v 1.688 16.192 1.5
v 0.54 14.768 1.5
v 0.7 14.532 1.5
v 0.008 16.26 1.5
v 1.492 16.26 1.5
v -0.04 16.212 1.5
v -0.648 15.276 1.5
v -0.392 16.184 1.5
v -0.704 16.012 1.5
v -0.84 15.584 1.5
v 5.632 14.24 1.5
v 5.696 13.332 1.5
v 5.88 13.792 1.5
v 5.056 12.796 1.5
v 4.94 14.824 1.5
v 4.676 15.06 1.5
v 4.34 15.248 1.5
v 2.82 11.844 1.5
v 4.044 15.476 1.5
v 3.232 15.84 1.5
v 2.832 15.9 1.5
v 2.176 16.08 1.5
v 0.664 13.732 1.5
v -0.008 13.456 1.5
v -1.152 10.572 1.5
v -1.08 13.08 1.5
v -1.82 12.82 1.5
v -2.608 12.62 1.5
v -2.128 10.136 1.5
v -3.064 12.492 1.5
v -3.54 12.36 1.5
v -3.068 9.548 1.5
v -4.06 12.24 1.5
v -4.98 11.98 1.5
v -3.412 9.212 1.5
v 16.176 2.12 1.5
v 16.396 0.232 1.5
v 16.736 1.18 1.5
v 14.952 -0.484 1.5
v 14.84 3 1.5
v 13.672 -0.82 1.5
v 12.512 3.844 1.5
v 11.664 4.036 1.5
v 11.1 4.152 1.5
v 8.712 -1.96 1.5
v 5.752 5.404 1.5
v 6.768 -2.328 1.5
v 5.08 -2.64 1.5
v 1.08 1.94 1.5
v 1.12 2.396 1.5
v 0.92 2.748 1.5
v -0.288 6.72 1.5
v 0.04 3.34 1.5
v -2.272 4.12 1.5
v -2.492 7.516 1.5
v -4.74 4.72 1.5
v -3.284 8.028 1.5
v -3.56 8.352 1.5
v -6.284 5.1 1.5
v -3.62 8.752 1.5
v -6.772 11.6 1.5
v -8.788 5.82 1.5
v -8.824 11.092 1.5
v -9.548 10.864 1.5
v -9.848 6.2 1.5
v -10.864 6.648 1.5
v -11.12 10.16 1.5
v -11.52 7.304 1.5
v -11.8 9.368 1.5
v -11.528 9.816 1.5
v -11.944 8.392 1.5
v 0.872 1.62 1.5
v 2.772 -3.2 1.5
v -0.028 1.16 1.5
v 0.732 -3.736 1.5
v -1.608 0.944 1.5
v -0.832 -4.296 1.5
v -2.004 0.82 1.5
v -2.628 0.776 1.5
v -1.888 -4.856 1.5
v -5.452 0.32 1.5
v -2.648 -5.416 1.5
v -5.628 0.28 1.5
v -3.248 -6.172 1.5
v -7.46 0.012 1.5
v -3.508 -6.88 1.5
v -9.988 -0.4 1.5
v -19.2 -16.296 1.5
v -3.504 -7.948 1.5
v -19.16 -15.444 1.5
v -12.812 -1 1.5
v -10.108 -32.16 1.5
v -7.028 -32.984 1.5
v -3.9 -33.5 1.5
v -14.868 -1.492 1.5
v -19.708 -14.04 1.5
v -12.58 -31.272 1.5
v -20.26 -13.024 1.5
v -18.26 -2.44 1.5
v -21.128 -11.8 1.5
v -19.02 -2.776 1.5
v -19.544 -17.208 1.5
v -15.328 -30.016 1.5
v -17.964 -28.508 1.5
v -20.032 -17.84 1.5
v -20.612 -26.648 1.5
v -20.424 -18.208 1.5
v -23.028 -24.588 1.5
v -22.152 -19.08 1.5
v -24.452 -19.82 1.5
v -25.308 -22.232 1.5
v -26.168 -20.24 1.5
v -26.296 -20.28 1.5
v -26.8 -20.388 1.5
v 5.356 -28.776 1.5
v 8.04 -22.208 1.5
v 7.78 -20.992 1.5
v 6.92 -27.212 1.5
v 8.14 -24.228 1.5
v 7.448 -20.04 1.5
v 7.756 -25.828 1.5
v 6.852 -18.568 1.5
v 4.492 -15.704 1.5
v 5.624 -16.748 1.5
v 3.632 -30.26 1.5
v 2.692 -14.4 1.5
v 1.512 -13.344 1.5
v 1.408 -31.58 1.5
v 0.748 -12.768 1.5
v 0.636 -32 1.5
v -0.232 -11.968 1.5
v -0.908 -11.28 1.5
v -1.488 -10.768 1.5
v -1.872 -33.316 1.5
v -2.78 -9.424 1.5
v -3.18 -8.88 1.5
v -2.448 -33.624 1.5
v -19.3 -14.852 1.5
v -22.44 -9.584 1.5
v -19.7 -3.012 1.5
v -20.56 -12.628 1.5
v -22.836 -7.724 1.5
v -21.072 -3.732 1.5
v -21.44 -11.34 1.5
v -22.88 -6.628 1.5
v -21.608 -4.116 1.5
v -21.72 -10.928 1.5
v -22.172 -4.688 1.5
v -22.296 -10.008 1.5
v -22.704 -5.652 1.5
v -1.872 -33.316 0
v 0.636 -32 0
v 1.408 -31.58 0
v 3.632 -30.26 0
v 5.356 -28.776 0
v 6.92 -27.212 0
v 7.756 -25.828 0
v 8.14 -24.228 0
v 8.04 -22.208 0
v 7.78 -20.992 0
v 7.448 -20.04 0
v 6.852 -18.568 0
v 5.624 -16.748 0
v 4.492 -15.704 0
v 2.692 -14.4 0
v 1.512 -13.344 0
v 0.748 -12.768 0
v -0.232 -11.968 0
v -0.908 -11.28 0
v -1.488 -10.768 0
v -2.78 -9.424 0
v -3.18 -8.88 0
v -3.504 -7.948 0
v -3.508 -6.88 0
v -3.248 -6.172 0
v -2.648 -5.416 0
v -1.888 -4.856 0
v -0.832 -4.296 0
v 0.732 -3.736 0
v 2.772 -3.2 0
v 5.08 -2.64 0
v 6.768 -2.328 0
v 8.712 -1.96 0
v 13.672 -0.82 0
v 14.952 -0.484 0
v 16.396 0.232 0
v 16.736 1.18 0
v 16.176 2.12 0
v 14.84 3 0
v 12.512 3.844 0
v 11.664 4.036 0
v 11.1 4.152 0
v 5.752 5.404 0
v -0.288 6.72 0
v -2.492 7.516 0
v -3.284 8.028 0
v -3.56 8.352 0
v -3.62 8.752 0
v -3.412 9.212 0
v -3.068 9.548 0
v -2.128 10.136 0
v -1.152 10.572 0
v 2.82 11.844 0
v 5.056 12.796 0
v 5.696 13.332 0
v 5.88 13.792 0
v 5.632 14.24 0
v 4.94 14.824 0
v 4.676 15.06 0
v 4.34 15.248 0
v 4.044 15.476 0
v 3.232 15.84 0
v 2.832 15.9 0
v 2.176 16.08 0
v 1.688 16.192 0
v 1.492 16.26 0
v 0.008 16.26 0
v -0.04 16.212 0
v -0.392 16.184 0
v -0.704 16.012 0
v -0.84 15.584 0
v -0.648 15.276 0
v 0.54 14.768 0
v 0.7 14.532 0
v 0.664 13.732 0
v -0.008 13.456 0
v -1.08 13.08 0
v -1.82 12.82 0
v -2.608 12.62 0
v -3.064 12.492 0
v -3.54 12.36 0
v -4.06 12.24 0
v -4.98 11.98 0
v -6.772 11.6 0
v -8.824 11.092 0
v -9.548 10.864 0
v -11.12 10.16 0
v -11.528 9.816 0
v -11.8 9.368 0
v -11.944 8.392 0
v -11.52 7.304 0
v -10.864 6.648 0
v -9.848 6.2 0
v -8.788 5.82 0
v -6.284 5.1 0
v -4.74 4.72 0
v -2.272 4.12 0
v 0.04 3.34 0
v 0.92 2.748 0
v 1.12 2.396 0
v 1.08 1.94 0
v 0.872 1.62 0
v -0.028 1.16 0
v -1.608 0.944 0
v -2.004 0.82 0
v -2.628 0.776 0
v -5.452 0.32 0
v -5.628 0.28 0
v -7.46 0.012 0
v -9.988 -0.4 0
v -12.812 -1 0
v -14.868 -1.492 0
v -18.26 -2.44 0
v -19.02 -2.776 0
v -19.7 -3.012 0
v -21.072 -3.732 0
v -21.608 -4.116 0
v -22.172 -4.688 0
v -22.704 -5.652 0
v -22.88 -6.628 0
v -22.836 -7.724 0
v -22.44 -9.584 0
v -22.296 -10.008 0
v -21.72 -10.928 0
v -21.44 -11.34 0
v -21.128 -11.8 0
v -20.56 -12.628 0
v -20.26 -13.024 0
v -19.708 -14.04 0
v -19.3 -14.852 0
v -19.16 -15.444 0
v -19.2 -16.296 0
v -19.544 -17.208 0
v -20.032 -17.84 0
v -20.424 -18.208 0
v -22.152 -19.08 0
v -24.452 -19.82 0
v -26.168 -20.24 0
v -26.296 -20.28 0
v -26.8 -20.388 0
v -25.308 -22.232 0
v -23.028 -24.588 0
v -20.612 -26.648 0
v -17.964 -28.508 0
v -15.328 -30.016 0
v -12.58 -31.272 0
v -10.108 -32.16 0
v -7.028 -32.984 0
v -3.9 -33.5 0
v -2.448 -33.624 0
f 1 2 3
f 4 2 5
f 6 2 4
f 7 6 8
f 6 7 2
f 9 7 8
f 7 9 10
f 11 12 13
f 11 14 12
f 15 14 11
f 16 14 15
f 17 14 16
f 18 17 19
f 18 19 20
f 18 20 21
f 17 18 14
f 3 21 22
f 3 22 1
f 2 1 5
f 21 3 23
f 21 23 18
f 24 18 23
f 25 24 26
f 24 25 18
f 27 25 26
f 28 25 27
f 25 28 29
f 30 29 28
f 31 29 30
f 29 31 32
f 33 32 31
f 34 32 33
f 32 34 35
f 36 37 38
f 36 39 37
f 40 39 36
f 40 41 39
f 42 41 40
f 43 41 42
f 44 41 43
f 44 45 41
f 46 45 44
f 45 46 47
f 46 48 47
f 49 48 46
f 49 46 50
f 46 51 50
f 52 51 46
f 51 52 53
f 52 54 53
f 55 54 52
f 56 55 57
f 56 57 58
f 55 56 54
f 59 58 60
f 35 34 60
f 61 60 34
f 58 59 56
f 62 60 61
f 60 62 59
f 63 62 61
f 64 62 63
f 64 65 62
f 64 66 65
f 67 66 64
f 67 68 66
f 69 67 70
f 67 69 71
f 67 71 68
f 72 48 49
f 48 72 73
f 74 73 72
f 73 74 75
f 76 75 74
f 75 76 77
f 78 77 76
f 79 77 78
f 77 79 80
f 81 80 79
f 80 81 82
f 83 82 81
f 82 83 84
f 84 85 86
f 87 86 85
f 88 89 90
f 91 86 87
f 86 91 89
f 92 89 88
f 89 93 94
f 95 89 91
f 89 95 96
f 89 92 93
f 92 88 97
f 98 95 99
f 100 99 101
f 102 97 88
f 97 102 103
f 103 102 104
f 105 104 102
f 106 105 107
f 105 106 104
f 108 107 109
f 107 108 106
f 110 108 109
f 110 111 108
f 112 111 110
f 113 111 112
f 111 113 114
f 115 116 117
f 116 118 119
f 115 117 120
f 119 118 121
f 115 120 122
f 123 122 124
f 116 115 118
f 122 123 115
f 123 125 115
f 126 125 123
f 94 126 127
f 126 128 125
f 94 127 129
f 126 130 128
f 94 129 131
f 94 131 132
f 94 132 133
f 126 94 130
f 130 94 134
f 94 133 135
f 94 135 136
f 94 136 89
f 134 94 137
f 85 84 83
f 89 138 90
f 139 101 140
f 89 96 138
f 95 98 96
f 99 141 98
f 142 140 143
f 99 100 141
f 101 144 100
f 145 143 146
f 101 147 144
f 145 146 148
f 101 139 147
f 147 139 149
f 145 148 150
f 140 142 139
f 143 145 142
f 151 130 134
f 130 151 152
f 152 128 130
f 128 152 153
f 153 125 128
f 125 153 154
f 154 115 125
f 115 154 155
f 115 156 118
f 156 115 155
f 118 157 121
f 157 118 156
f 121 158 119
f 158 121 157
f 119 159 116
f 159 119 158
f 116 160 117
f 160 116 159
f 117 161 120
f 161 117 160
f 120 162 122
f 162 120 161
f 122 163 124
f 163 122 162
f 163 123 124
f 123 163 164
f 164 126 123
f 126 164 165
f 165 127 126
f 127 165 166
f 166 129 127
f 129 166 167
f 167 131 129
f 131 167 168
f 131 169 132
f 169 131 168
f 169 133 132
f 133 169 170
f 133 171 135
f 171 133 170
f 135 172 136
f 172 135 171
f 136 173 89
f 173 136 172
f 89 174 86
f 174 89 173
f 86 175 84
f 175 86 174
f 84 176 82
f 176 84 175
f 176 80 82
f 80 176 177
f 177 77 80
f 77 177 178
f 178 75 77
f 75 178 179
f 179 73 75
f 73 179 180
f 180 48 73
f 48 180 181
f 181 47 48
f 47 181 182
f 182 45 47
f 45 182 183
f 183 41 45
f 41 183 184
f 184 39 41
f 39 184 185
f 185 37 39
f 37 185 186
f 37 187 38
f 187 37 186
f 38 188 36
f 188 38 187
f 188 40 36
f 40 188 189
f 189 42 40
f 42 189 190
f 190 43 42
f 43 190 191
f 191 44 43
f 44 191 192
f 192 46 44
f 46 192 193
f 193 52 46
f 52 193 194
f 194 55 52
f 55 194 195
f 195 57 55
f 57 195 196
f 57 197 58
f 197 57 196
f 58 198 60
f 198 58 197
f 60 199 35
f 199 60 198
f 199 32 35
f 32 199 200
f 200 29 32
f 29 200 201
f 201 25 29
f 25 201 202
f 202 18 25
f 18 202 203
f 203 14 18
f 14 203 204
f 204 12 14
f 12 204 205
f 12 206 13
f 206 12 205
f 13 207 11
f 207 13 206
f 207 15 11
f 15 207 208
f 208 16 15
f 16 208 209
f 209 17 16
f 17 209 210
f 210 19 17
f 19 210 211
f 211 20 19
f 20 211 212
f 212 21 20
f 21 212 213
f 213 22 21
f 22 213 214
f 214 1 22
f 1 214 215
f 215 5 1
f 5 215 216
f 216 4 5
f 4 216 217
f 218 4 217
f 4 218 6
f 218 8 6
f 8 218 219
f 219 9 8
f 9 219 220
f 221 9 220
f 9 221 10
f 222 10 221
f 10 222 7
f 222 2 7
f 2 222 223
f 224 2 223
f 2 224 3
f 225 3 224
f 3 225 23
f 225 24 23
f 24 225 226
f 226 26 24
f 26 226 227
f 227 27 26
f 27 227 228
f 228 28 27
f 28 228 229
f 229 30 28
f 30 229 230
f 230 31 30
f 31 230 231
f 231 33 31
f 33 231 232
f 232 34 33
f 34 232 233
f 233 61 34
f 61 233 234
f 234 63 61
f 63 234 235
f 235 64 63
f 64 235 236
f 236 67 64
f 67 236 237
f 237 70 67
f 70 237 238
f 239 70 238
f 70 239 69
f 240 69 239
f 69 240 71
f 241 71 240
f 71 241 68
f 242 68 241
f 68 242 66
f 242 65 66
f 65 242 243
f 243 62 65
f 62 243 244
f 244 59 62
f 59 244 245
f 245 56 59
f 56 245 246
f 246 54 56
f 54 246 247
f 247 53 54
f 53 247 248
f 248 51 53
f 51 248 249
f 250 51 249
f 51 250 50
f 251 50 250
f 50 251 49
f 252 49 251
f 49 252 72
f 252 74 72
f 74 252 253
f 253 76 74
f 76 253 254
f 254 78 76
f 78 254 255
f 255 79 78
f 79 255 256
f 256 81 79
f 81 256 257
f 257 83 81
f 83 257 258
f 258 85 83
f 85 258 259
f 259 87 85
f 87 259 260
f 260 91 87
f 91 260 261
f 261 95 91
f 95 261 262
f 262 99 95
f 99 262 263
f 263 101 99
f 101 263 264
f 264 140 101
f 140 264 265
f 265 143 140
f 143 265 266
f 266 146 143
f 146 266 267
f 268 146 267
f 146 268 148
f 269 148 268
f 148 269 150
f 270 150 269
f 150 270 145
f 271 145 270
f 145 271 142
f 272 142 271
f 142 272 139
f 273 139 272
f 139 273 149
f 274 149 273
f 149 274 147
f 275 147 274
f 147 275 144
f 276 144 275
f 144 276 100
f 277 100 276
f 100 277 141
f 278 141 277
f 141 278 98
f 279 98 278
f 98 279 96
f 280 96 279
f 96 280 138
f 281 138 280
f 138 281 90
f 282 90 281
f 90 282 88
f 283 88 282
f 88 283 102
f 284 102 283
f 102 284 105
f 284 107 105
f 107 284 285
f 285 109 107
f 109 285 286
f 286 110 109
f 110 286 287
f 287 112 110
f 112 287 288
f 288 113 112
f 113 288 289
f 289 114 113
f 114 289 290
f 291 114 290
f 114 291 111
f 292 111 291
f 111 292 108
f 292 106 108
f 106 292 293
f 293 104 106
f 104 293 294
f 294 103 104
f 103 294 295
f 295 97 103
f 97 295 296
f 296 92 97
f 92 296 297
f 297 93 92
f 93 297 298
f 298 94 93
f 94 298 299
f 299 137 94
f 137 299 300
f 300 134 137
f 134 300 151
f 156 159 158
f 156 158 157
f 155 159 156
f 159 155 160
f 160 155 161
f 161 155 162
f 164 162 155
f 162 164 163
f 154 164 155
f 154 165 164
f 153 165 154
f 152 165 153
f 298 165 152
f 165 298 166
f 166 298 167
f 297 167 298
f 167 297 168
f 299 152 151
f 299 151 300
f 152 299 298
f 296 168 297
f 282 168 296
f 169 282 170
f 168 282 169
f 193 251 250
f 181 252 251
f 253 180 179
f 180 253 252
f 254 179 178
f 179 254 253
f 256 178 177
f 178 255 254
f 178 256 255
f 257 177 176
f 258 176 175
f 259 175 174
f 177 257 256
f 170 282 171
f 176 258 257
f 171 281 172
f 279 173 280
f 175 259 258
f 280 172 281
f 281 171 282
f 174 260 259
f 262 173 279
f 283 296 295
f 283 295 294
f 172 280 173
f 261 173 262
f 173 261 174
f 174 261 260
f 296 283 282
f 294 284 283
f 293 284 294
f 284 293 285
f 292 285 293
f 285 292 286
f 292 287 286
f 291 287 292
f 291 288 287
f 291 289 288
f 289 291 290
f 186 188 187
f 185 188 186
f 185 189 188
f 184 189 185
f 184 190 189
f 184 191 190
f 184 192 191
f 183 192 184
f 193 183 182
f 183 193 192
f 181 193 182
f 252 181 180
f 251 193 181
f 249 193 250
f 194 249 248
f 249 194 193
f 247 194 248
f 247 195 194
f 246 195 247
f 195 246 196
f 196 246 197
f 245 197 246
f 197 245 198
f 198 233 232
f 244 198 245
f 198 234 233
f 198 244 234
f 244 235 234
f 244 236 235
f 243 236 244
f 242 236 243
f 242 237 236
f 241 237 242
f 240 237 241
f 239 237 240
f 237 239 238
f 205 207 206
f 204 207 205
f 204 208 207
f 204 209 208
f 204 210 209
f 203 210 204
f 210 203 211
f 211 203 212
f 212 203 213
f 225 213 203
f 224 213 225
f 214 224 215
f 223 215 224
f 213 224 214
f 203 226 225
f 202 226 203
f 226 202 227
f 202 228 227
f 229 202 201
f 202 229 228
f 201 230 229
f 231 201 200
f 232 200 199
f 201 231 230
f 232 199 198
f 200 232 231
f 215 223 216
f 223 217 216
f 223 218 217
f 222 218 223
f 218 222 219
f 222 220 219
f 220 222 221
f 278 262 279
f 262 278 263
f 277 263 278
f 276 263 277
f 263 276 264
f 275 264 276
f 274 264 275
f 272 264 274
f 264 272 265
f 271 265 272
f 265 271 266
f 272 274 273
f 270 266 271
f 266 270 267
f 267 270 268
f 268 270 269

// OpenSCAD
// file: CrickCoin3text.scad
module CrickCoin3text_1()
{
 /* Generated by trace2scad version 20150415
    http://aggregate.org/MAKE/TRACE2SCAD/
    Optimized model has 221/1642 original points
 */
 color([0.5, 0.5, 0.5])
 assign(minx=0) /* polygon minx=0 */
 assign(miny=0) /* polygon miny=0 */
 assign(maxx=20000) /* polygon maxx=20000 */
 assign(maxy=19690) /* polygon maxy=19690 */
 assign(dx=maxx-minx)
 assign(dy=maxy-miny)
 assign(maxd=((dx>dy)?dx:dy))
 scale([1/maxd, 1/maxd, 1])
 translate([-minx-dx/2, -miny-dy/2, 0])
 linear_extrude(height=1, convexity=221)
 union() {
  union() {
   polygon([[1,18799],[3,17908],[221,17839],[472,17805],[701,17833],[908,17890],[1153,18025],[1430,18292],[1584,18588],[1629,18742],[1660,18993],[1623,19271],[1575,19428],[1438,19676],[1425,19690],[0,19690]], convexity=5);
   polygon([[18275,19684],[18275,19678],[18190,19480],[18139,19274],[18133,19174],[18133,19061],[18165,18838],[18210,18684],[18345,18443],[18390,18373],[18617,18160],[18878,18016],[19060,17965],[19152,17947],[19364,17930],[19474,17948],[19726,18011],[20000,18151],[20000,19690],[18275,19690]], convexity=7);
   polygon([[5228,15624],[5158,15620],[4708,15554],[4315,15427],[3984,15245],[3742,15043],[3520,14774],[3360,14466],[3256,14108],[3214,13813],[3222,13351],[3301,12933],[3432,12608],[3588,12359],[3823,12108],[4113,11902],[4473,11740],[4903,11636],[5413,11596],[5925,11637],[6365,11734],[6600,11812],[6600,11843],[6633,11863],[6675,11943],[6680,12698],[6631,12836],[6537,12895],[6467,12895],[6383,12853],[6297,12719],[6272,12683],[6130,12598],[6061,12539],[5783,12485],[5482,12480],[5238,12513],[4977,12614],[4779,12768],[4635,12954],[4535,13193],[4485,13501],[4495,13846],[4569,14133],[4691,14361],[4883,14554],[5093,14669],[5373,14740],[5723,14750],[5876,14720],[6100,14613],[6472,14363],[6542,14345],[6618,14365],[6669,14396],[6705,14471],[6690,14813],[6685,15328],[6619,15433],[6518,15495],[6353,15522],[6289,15551],[6103,15554],[5678,15620],[5298,15628]], convexity=12);
   polygon([[11264,15383],[11226,15363],[11170,15267],[11170,15098],[11258,14950],[11365,14778],[11475,14418],[11970,12538],[11977,12212],[12039,12104],[12107,12070],[12200,12060],[12308,12055],[12411,12068],[13148,12050],[13229,12095],[13270,12175],[13260,12274],[13244,12287],[13265,12463],[13617,13886],[13693,13940],[13753,13940],[13823,13878],[14145,12562],[14154,12418],[14160,12268],[14155,12184],[14210,12094],[14277,12060],[14898,12075],[15128,12081],[15186,12050],[15268,12050],[15356,12108],[15410,12205],[15410,12328],[16026,14638],[16100,14845],[16157,14984],[16225,15133],[16225,15204],[16173,15294],[16098,15330],[15762,15300],[15674,15289],[15604,15310],[15265,15320],[15174,15265],[15140,15198],[15126,14998],[15056,14643],[14752,13441],[14723,13395],[14639,13404],[14586,13443],[14295,14623],[14270,14915],[14240,15028],[14235,15088],[14240,15173],[14178,15280],[14103,15320],[13465,15310],[13389,15330],[13317,15312],[13265,15279],[13225,15201],[13208,14898],[12858,13498],[12798,13450],[12696,13460],[12652,13509],[12367,14720],[12350,14890],[12330,14925],[12323,15013],[12305,15051],[12305,15198],[12248,15301],[12170,15340],[11868,15335],[11468,15361],[11379,15405],[11303,15404]], convexity=31);
   polygon([[19317,1895],[19313,1891],[19054,1852],[18793,1743],[18637,1640],[18420,1407],[18319,1238],[18230,1004],[18192,716],[18215,488],[18257,332],[18390,63],[18428,3],[20000,0],[20000,1719],[19773,1825],[19567,1880],[19322,1900]], convexity=6);
   polygon([[417,1770],[413,1766],[194,1738],[3,1672],[0,0],[1498,0],[1595,225],[1629,342],[1650,479],[1655,643],[1623,863],[1544,1085],[1415,1303],[1173,1545],[875,1700],[665,1755],[422,1775]], convexity=5);
  }
 }
}

module CrickCoin3text()
{
 /* all layers combined, scaled to within a 1mm cube */
 scale([1, 1, 1/1])
 difference() {
  union() {
   scale([1,1,2]) translate([0,0,-0.5]) CrickCoin3text_1();
  }
  translate([0,0,-2]) cube([2,2,4],center=true);
 }
}
CrickCoin3text();
// file: CrickCoin3white.scad
module CrickCoin3white_1()
{
 /* Generated by trace2scad version 20150415
    http://aggregate.org/MAKE/TRACE2SCAD/
    Optimized model has 217/2306 original points
 */
 color([0.5, 0.5, 0.5])
 assign(minx=0) /* polygon minx=0 */
 assign(miny=0) /* polygon miny=0 */
 assign(maxx=20000) /* polygon maxx=20000 */
 assign(maxy=19690) /* polygon maxy=19690 */
 assign(dx=maxx-minx)
 assign(dy=maxy-miny)
 assign(maxd=((dx>dy)?dx:dy))
 scale([1/maxd, 1/maxd, 1])
 translate([-minx-dx/2, -miny-dy/2, 0])
 linear_extrude(height=1, convexity=217)
 union() {
  union() {
   polygon([[1,18799],[3,17908],[221,17839],[472,17805],[701,17833],[908,17890],[1153,18025],[1430,18292],[1584,18588],[1629,18742],[1660,18993],[1623,19271],[1575,19428],[1438,19676],[1425,19690],[0,19690]], convexity=5);
   polygon([[18275,19684],[18275,19678],[18190,19480],[18139,19274],[18133,19174],[18133,19061],[18165,18838],[18210,18684],[18345,18443],[18390,18373],[18617,18160],[18878,18016],[19060,17965],[19152,17947],[19364,17930],[19474,17948],[19726,18011],[20000,18151],[20000,19690],[18275,19690]], convexity=7);
   union() {
    difference() {
     polygon([[9773,19182],[9718,19180],[8873,19120],[7988,18976],[7175,18765],[6498,18531],[5833,18244],[5096,17850],[4363,17369],[3699,16841],[3097,16268],[2607,15718],[2098,15036],[1666,14338],[1281,13563],[979,12783],[740,11942],[589,11128],[510,10283],[504,9644],[560,8823],[704,7938],[915,7135],[1174,6408],[1514,5663],[1945,4913],[2375,4295],[2908,3651],[3556,3003],[4169,2493],[4825,2033],[5523,1629],[6286,1270],[7128,965],[7968,745],[8790,607],[9468,546],[9981,529],[10883,575],[11771,700],[12613,899],[13443,1176],[14106,1460],[14877,1872],[15563,2320],[16203,2822],[16744,3324],[17328,3964],[17799,4583],[18245,5288],[18623,6023],[18921,6753],[19154,7498],[19328,8298],[19430,9088],[19466,9859],[19420,10743],[19299,11583],[19115,12358],[18863,13123],[18575,13801],[18159,14578],[17698,15275],[17248,15848],[16943,16192],[16371,16747],[15728,17275],[15083,17719],[14408,18105],[13608,18475],[12805,18760],[11998,18971],[11133,19115],[10288,19180],[9828,19184]], convexity=6);
     polygon([[10333,18430],[10453,18425],[11265,18345],[12058,18190],[12810,17967],[13564,17665],[14273,17299],[14958,16858],[15578,16370],[16118,15863],[16643,15269],[16935,14883],[17349,14247],[17715,13551],[17994,12888],[18241,12110],[18400,11385],[18500,10588],[18525,9755],[18470,8963],[18341,8158],[18141,7393],[17883,6677],[17554,5968],[17144,5268],[16638,4566],[16218,4083],[15665,3548],[15125,3107],[14539,2704],[13890,2337],[13158,2006],[12433,1756],[11733,1581],[10923,1455],[10280,1410],[9488,1425],[8718,1510],[7910,1677],[7140,1915],[6413,2217],[5733,2576],[5048,3025],[4428,3522],[3852,4078],[3330,4684],[2891,5303],[2496,5983],[2149,6738],[1910,7409],[1724,8123],[1595,8893],[1535,9693],[1550,10453],[1640,11268],[1814,12093],[2056,12860],[2340,13543],[2691,14213],[3132,14893],[3627,15518],[4063,15980],[4593,16463],[5175,16907],[5898,17359],[6650,17730],[7273,17974],[8023,18192],[8703,18330],[9558,18421],[10213,18435]], convexity=6);
    }
   }
   polygon([[19317,1895],[19313,1891],[19054,1852],[18793,1743],[18637,1640],[18420,1407],[18319,1238],[18230,1004],[18192,716],[18215,488],[18257,332],[18390,63],[18428,3],[20000,0],[20000,1719],[19773,1825],[19567,1880],[19322,1900]], convexity=6);
   polygon([[417,1770],[413,1766],[194,1738],[3,1672],[0,0],[1498,0],[1595,225],[1629,342],[1650,479],[1655,643],[1623,863],[1544,1085],[1415,1303],[1173,1545],[875,1700],[665,1755],[422,1775]], convexity=5);
  }
 }
}

module CrickCoin3white()
{
 /* all layers combined, scaled to within a 1mm cube */
 scale([1, 1, 1/1])
 difference() {
  union() {
   scale([1,1,2]) translate([0,0,-0.5]) CrickCoin3white_1();
  }
  translate([0,0,-2]) cube([2,2,4],center=true);
 }
}
CrickCoin3white();
// file: CrickCoin3purple.scad
module CrickCoin3purple_1()
{
 /* Generated by trace2scad version 20150415
    http://aggregate.org/MAKE/TRACE2SCAD/
    Optimized model has 222/2741 original points
 */
 color([0.5, 0.5, 0.5])
 assign(minx=0) /* polygon minx=0 */
 assign(miny=0) /* polygon miny=0 */
 assign(maxx=20000) /* polygon maxx=20000 */
 assign(maxy=19690) /* polygon maxy=19690 */
 assign(dx=maxx-minx)
 assign(dy=maxy-miny)
 assign(maxd=((dx>dy)?dx:dy))
 scale([1/maxd, 1/maxd, 1])
 translate([-minx-dx/2, -miny-dy/2, 0])
 linear_extrude(height=1, convexity=222)
 union() {
  union() {
   polygon([[1,18799],[3,17908],[221,17839],[472,17805],[701,17833],[908,17890],[1153,18025],[1430,18292],[1584,18588],[1629,18742],[1660,18993],[1623,19271],[1575,19428],[1438,19676],[1425,19690],[0,19690]], convexity=5);
   polygon([[18275,19684],[18275,19678],[18190,19480],[18139,19274],[18133,19174],[18133,19061],[18165,18838],[18210,18684],[18345,18443],[18390,18373],[18617,18160],[18878,18016],[19060,17965],[19152,17947],[19364,17930],[19474,17948],[19726,18011],[20000,18151],[20000,19690],[18275,19690]], convexity=7);
   polygon([[9996,13904],[9990,13898],[9902,13891],[9824,13848],[9790,13741],[9838,13664],[10135,13537],[10175,13478],[10166,13278],[9998,13209],[9730,13115],[9545,13050],[9348,13000],[9234,12968],[9115,12935],[8985,12905],[8755,12840],[8307,12745],[7794,12618],[7613,12561],[7220,12385],[7118,12299],[7050,12187],[7014,11943],[7120,11671],[7284,11507],[7538,11395],[7803,11300],[8429,11120],[8815,11025],[9432,10875],[10010,10680],[10230,10532],[10280,10444],[10270,10330],[10218,10250],[9993,10135],[9598,10081],[9499,10050],[9343,10039],[8637,9925],[8593,9915],[8135,9848],[7503,9745],[6797,9595],[6283,9472],[5435,9235],[5245,9151],[5075,9092],[4732,8912],[4598,8816],[4457,8673],[4324,8432],[4280,8188],[4291,7914],[4390,7449],[4426,7343],[4570,7113],[4640,7010],[4718,6895],[4860,6688],[4935,6589],[5073,6335],[5175,6132],[5210,5984],[5200,5771],[5114,5543],[4992,5385],[4894,5293],[4462,5075],[3887,4890],[3458,4785],[3426,4775],[3300,4748],[3673,4287],[4243,3698],[4847,3183],[5509,2718],[6168,2341],[6855,2027],[7473,1805],[8243,1599],[9025,1470],[9388,1439],[9532,1516],[10159,1845],[10352,1950],[10908,2280],[11339,2651],[11730,3042],[11939,3388],[12035,3788],[12010,4293],[11945,4597],[11862,4835],[11713,5203],[11406,5658],[11123,5919],[10673,6245],[10378,6509],[10187,6653],[9942,6853],[9773,7025],[9628,7153],[9305,7489],[9205,7625],[9124,7858],[9123,8125],[9188,8302],[9338,8491],[9528,8631],[9792,8771],[10183,8911],[10693,9045],[11270,9185],[11692,9263],[12178,9355],[13418,9640],[13738,9724],[14099,9903],[14184,10140],[14044,10375],[13710,10595],[13128,10806],[12916,10854],[12775,10883],[11438,11196],[9928,11525],[9377,11724],[9179,11852],[9110,11933],[9095,12033],[9147,12148],[9233,12232],[9468,12379],[9712,12488],[10705,12806],[11264,13044],[11424,13178],[11470,13293],[11408,13405],[11235,13551],[11169,13610],[11085,13657],[11011,13714],[10808,13805],[10708,13820],[10544,13865],[10422,13893],[10373,13910],[10002,13910]], convexity=16);
   polygon([[19317,1895],[19313,1891],[19054,1852],[18793,1743],[18637,1640],[18420,1407],[18319,1238],[18230,1004],[18192,716],[18215,488],[18257,332],[18390,63],[18428,3],[20000,0],[20000,1719],[19773,1825],[19567,1880],[19322,1900]], convexity=6);
   polygon([[417,1770],[413,1766],[194,1738],[3,1672],[0,0],[1498,0],[1595,225],[1629,342],[1650,479],[1655,643],[1623,863],[1544,1085],[1415,1303],[1173,1545],[875,1700],[665,1755],[422,1775]], convexity=5);
  }
 }
}

module CrickCoin3purple()
{
 /* all layers combined, scaled to within a 1mm cube */
 scale([1, 1, 1/1])
 difference() {
  union() {
   scale([1,1,2]) translate([0,0,-0.5]) CrickCoin3purple_1();
  }
  translate([0,0,-2]) cube([2,2,4],center=true);
 }
}
CrickCoin3purple();
// main file
//======================================================================
// CrickEar4.scad
//
// New version of Crick Wooder Earrings
//
// DrTomFlint, 5 Sept 2024
//======================================================================


use <./CrickCoin3purple.scad>
use <./CrickCoin3white.scad>
use <./CrickCoin3text.scad>

use <./CrickEar5.scad>

//----------------------------------------------------------------------

if(1){
intersection(){
  cylinder(r=37,h=1.5,$fn=300);

  scale([80,80,1.5]){
    
    //~ CrickCoin3white();
    //~ CrickCoin3text();

    CrickCoin3purple();

    }
  }
}
// for white add an earring loop
if(0){
  difference(){
    hull(){
      cylinder(r=37,h=1.5,$fn=300);
      translate([0,40,0])
      cylinder(r=2.5,h=1.5,$fn=300);
    }
    // cut loop hole
    translate([0,38.5,0])
    cylinder(r=1.5,h=5,$fn=30,center=true);
    // recut center area
    cylinder(r=37-0.5,h=5,$fn=300,center=true);
  }
}

// get black by subtraction so no voids between parts
if(0){
  //color("black")
difference(){
  cylinder(r=37,h=1.5,$fn=300);

  translate([0,0,-1])
  scale([80,80,4]){  
    CrickCoin3purple();
    CrickCoin3white();
    //~ CrickCoin3text();  
  }
  // trim border scrum
  translate([-24,-40.3,0])
  cube([40,40,6],center=true);
  
}

}

// clear disk bottom
if(0){
  color("cyan",alpha=0.4)
  translate([0,0,-0.3])  
  cylinder(r=36,h=0.3,$fn=300);
}

// clear top bottom
if(0){
  color("cyan",alpha=0.4)
  translate([0,0,1.2])  
  cylinder(r=36,h=0.3,$fn=300);
}


//=====================================================
